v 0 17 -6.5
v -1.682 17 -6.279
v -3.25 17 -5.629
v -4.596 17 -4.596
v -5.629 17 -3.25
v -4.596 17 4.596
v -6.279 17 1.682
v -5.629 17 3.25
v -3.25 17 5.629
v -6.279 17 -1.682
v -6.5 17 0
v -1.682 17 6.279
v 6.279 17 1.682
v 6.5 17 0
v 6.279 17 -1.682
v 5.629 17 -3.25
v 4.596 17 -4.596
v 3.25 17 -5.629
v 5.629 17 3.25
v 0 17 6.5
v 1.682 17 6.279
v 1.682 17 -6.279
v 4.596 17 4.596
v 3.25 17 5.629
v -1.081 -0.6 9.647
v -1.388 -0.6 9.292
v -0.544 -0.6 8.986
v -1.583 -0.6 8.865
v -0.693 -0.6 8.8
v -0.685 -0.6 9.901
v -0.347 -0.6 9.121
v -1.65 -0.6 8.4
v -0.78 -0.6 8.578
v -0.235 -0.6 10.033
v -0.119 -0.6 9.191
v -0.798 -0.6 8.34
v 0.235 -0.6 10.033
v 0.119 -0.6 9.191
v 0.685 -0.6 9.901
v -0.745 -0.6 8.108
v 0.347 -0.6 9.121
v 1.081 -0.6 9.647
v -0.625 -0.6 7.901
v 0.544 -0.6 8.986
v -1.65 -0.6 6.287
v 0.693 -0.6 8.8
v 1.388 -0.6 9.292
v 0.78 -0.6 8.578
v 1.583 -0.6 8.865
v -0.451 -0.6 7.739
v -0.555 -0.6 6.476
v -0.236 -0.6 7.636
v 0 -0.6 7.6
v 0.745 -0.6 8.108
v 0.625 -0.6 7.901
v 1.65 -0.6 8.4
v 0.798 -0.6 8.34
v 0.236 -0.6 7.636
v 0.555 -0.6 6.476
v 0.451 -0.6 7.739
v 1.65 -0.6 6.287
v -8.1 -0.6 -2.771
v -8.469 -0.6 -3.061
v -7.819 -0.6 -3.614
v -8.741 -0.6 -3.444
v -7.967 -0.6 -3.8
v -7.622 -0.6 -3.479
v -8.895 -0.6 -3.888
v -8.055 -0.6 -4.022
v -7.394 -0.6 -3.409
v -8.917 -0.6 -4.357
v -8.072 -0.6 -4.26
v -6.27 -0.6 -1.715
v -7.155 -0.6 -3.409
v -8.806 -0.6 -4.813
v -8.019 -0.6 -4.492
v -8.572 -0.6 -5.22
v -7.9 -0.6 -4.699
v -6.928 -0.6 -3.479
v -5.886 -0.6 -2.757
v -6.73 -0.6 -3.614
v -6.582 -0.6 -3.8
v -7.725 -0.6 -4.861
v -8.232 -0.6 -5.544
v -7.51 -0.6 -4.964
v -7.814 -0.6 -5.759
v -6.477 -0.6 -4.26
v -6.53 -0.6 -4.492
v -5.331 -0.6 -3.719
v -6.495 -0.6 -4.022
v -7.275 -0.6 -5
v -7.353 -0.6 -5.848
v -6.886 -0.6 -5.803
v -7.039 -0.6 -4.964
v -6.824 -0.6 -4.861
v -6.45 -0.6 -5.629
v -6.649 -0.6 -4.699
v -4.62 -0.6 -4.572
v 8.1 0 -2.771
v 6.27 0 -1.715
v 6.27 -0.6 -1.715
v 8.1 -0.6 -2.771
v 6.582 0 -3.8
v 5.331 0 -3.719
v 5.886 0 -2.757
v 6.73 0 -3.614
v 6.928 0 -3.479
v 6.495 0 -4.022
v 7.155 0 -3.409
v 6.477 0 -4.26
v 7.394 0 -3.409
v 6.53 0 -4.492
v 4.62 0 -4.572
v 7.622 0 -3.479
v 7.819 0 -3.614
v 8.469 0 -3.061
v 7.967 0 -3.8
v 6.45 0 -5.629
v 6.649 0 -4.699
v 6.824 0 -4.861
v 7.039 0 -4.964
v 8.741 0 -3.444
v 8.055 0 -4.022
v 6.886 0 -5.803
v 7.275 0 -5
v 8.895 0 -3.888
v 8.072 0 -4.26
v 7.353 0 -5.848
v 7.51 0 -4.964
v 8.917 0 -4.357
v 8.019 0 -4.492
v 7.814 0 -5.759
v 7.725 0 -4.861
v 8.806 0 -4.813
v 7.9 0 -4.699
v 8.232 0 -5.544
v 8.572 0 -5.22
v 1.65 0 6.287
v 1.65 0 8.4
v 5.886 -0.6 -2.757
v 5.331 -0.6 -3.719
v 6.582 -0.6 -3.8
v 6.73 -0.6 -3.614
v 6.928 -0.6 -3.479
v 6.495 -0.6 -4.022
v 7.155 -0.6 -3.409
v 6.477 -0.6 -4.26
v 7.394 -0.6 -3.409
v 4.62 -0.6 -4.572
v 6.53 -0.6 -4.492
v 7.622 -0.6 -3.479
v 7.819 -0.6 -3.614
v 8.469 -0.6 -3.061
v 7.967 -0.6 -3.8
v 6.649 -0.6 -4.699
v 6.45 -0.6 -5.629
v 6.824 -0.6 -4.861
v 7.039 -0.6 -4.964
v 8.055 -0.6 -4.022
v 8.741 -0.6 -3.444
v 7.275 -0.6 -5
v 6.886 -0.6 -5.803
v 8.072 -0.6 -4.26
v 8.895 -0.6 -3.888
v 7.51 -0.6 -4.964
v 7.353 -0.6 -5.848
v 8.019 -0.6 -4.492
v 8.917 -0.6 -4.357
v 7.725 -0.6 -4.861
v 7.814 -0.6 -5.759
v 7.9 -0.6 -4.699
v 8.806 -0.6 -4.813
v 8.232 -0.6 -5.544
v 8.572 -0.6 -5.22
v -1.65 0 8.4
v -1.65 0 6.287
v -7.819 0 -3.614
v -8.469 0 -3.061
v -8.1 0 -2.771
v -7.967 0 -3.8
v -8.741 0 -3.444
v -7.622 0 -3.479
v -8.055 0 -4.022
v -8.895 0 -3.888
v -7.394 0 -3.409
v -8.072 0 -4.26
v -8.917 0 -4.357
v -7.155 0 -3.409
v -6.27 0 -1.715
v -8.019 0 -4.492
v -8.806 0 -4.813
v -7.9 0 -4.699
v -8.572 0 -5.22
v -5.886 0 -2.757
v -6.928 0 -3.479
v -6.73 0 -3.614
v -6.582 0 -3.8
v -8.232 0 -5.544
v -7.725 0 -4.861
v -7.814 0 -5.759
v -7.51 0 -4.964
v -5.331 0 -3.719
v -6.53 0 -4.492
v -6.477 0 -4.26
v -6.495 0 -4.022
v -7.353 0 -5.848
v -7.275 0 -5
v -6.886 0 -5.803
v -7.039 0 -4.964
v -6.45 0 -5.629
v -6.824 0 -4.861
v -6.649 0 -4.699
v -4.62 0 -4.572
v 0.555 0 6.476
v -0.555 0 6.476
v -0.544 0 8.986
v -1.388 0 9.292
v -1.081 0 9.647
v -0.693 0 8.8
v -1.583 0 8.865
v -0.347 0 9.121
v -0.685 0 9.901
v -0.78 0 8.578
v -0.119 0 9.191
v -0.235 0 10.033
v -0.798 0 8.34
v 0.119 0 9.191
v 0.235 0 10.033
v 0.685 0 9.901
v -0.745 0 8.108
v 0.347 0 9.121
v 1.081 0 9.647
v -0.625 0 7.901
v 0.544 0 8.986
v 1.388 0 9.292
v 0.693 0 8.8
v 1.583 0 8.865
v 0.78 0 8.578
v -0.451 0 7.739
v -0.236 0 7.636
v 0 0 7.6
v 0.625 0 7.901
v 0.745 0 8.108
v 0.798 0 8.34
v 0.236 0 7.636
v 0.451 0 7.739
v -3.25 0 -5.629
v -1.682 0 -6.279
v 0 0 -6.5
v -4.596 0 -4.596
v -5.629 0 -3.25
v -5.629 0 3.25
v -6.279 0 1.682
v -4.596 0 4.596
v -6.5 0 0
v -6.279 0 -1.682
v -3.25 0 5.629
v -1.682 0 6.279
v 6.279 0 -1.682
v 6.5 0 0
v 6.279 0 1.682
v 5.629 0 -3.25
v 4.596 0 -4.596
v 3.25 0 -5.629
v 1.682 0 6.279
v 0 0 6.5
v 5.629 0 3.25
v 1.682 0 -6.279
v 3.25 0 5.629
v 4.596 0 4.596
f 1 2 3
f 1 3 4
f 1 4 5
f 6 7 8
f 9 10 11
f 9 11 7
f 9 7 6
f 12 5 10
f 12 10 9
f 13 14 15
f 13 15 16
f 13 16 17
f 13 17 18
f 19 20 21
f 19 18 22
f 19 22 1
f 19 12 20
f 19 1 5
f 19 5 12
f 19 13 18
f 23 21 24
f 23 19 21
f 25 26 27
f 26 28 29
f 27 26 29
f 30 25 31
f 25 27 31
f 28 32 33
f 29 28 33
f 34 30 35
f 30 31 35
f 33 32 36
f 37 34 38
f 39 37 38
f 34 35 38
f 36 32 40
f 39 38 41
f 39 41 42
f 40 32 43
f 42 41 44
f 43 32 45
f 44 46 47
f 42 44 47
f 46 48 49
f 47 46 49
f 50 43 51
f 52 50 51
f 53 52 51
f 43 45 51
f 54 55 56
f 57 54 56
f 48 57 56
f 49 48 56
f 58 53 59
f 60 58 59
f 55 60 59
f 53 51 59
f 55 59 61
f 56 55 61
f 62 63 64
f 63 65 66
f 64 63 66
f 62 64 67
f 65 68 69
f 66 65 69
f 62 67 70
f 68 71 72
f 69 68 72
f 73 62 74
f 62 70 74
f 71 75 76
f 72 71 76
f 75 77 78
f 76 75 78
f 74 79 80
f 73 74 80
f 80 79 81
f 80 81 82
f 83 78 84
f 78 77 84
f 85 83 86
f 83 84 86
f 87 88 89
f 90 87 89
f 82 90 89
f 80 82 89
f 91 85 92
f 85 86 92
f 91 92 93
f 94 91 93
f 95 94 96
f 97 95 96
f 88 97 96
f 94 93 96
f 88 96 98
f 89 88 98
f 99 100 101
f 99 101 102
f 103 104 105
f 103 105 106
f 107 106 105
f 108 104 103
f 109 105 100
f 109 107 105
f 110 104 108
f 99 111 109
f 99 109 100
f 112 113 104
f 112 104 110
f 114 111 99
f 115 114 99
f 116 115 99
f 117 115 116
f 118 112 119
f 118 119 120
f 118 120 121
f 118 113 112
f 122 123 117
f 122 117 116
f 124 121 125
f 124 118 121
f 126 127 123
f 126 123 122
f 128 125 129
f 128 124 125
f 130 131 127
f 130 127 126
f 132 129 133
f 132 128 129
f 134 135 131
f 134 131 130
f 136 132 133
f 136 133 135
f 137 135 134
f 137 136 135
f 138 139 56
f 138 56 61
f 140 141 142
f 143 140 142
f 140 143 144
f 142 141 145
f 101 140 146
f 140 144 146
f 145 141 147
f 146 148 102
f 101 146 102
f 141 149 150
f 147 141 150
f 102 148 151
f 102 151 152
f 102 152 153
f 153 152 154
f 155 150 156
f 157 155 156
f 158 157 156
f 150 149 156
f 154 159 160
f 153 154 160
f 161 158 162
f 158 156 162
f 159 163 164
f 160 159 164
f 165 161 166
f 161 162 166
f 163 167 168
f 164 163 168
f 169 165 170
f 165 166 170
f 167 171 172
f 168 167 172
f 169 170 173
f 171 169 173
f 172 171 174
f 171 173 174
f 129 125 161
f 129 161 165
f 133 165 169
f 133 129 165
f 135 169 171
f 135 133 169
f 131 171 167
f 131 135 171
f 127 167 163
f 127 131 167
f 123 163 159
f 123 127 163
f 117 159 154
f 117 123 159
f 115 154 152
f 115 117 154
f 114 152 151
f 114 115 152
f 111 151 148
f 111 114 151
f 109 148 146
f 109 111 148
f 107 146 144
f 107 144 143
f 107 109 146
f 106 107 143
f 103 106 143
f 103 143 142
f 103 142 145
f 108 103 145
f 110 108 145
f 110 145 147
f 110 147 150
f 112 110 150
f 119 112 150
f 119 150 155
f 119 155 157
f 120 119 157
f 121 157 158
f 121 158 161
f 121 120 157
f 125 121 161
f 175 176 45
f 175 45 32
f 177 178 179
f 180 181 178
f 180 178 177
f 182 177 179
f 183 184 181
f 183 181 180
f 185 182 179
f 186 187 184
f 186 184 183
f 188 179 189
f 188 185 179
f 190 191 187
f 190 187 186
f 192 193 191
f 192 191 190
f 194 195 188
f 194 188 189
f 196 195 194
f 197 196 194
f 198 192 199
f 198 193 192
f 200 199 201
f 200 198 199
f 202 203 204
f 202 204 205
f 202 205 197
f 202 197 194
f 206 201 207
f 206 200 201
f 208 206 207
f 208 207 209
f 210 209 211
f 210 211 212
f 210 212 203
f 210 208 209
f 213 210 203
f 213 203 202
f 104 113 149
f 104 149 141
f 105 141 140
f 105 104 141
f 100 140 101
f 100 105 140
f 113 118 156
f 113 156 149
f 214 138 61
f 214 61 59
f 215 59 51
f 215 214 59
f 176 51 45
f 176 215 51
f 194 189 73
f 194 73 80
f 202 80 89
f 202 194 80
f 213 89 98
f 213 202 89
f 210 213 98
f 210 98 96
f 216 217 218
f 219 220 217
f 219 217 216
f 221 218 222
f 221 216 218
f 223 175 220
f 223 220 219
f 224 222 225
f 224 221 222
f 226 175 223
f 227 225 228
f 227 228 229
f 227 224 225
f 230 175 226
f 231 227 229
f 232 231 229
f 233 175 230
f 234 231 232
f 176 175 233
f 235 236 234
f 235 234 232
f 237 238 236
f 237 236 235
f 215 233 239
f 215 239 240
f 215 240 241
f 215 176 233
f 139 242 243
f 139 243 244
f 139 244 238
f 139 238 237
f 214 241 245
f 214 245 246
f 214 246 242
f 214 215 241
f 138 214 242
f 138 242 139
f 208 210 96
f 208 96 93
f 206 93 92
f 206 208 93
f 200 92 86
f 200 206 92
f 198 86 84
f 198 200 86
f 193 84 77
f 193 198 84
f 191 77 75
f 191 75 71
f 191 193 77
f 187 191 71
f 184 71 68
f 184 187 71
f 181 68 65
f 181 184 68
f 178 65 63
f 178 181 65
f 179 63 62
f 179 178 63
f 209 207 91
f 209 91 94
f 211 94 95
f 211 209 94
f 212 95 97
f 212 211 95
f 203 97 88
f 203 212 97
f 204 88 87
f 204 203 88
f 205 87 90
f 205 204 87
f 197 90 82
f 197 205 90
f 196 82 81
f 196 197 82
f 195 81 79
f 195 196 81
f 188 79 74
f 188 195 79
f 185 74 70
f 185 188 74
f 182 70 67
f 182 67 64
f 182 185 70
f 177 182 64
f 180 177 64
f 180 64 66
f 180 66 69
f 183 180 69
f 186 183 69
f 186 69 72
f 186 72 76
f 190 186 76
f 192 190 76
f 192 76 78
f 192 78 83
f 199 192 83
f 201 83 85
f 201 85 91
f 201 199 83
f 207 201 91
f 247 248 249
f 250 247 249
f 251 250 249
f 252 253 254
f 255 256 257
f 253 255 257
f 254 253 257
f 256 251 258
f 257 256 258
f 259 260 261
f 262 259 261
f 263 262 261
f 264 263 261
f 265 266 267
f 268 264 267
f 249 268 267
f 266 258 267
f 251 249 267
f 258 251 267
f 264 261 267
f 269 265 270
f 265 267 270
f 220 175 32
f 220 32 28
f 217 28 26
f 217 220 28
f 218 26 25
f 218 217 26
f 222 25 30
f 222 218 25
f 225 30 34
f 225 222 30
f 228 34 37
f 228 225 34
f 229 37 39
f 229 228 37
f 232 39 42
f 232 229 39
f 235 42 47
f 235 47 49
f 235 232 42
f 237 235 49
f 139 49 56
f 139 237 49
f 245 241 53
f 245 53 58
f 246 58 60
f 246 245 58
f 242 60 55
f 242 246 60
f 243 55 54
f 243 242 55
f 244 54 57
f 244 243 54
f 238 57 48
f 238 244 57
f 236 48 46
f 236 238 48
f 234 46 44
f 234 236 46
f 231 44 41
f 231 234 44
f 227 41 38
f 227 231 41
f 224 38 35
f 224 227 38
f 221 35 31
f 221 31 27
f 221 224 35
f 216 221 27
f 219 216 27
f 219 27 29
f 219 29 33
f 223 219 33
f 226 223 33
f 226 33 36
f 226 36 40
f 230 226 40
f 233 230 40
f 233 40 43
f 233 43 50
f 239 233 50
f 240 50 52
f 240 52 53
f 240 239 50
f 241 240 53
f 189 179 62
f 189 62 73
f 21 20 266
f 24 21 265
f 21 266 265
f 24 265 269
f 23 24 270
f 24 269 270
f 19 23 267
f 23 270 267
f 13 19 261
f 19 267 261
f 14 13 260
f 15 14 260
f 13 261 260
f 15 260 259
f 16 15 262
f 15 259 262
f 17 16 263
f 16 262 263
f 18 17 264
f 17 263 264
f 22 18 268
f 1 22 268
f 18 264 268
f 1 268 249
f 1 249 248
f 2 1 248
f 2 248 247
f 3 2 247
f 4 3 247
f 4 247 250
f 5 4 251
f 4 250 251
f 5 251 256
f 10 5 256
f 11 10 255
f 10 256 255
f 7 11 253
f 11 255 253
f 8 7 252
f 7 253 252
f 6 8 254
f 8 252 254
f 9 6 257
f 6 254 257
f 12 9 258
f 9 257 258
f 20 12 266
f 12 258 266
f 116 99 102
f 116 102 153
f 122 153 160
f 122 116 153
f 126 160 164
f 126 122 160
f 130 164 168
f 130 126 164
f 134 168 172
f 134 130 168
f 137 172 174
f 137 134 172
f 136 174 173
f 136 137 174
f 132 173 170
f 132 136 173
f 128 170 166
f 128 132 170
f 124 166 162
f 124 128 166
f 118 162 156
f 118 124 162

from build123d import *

# Parameters (mm, degrees)
SKETCH1_R             = 6.5
BOSS_EXTRUDE1_DEPTH   = 17
SKETCH2_R             = 0.8
BOSS_EXTRUDE2_DEPTH   = 0.6
BOSS_EXTRUDE2_2_DEPTH = 0.6
BOSS_EXTRUDE2_3_DEPTH = 0.6


with BuildPart() as part:
    # Sketch1 → Boss-Extrude1 (new body)
    with BuildSketch(Plane(origin=(0, 0, 0), x_dir=(1, 0, 0), z_dir=(0, 1, 0))):
        with Locations(Location((0, 0, 0), (0, 0, 270))):
            Circle(SKETCH1_R)
    extrude(amount=BOSS_EXTRUDE1_DEPTH)


with BuildPart() as body_2:
    # Sketch2 → Boss-Extrude2 (new body)
    with BuildSketch(Plane(origin=(0, 0, 0), x_dir=(-1, 0, 0), z_dir=(0, -1, 0))):
        with BuildLine():
            Line((1.65, -6.287089947), (1.65, -8.4))
            ThreePointArc((1.65, -8.4), (0, -10.05), (-1.65, -8.4))
            Line((-1.65, -8.4), (-1.65, -6.287089947))
            ThreePointArc((-1.65, -6.287089947), (0, -6.5), (1.65, -6.287089947))
        make_face()
        with Locations(Location((0, -8.4, 0), (0, 0, 90))):
            Circle(SKETCH2_R, mode=Mode.SUBTRACT)
    extrude(amount=BOSS_EXTRUDE2_DEPTH)


with BuildPart() as body_3:
    # Sketch2 → Boss-Extrude2 2 (new body)
    with BuildSketch(Plane(origin=(0, 0, 0), x_dir=(-1, 0, 0), z_dir=(0, -1, 0))):
        with BuildLine():
            Line((-6.26977961, 1.714603057), (-8.099613392, 2.771058084))
            ThreePointArc((-8.099613392, 2.771058084), (-8.703555308, 5.025), (-6.449613392, 5.628941916))
            Line((-6.449613392, 5.628941916), (-4.61977961, 4.57248689))
            ThreePointArc((-4.61977961, 4.57248689), (-5.629165125, 3.25), (-6.26977961, 1.714603057))
        make_face()
        with Locations(Location((-7.274613392, 4.2, 0), (0, 0, 90))):
            Circle(SKETCH2_R, mode=Mode.SUBTRACT)
    extrude(amount=BOSS_EXTRUDE2_2_DEPTH)


with BuildPart() as body_4:
    # Sketch2 → Boss-Extrude2 3 (new body)
    with BuildSketch(Plane(origin=(0, 0, 0), x_dir=(-1, 0, 0), z_dir=(0, -1, 0))):
        with BuildLine():
            Line((4.61977961, 4.57248689), (6.449613392, 5.628941916))
            ThreePointArc((6.449613392, 5.628941916), (8.703555308, 5.025), (8.099613392, 2.771058084))
            Line((8.099613392, 2.771058084), (6.26977961, 1.714603057))
            ThreePointArc((6.26977961, 1.714603057), (5.629165125, 3.25), (4.61977961, 4.57248689))
        make_face()
        with Locations(Location((7.274613392, 4.2, 0), (0, 0, 90))):
            Circle(SKETCH2_R, mode=Mode.SUBTRACT)
    extrude(amount=BOSS_EXTRUDE2_3_DEPTH)


solid = Compound([part.part, body_2.part, body_3.part, body_4.part])
